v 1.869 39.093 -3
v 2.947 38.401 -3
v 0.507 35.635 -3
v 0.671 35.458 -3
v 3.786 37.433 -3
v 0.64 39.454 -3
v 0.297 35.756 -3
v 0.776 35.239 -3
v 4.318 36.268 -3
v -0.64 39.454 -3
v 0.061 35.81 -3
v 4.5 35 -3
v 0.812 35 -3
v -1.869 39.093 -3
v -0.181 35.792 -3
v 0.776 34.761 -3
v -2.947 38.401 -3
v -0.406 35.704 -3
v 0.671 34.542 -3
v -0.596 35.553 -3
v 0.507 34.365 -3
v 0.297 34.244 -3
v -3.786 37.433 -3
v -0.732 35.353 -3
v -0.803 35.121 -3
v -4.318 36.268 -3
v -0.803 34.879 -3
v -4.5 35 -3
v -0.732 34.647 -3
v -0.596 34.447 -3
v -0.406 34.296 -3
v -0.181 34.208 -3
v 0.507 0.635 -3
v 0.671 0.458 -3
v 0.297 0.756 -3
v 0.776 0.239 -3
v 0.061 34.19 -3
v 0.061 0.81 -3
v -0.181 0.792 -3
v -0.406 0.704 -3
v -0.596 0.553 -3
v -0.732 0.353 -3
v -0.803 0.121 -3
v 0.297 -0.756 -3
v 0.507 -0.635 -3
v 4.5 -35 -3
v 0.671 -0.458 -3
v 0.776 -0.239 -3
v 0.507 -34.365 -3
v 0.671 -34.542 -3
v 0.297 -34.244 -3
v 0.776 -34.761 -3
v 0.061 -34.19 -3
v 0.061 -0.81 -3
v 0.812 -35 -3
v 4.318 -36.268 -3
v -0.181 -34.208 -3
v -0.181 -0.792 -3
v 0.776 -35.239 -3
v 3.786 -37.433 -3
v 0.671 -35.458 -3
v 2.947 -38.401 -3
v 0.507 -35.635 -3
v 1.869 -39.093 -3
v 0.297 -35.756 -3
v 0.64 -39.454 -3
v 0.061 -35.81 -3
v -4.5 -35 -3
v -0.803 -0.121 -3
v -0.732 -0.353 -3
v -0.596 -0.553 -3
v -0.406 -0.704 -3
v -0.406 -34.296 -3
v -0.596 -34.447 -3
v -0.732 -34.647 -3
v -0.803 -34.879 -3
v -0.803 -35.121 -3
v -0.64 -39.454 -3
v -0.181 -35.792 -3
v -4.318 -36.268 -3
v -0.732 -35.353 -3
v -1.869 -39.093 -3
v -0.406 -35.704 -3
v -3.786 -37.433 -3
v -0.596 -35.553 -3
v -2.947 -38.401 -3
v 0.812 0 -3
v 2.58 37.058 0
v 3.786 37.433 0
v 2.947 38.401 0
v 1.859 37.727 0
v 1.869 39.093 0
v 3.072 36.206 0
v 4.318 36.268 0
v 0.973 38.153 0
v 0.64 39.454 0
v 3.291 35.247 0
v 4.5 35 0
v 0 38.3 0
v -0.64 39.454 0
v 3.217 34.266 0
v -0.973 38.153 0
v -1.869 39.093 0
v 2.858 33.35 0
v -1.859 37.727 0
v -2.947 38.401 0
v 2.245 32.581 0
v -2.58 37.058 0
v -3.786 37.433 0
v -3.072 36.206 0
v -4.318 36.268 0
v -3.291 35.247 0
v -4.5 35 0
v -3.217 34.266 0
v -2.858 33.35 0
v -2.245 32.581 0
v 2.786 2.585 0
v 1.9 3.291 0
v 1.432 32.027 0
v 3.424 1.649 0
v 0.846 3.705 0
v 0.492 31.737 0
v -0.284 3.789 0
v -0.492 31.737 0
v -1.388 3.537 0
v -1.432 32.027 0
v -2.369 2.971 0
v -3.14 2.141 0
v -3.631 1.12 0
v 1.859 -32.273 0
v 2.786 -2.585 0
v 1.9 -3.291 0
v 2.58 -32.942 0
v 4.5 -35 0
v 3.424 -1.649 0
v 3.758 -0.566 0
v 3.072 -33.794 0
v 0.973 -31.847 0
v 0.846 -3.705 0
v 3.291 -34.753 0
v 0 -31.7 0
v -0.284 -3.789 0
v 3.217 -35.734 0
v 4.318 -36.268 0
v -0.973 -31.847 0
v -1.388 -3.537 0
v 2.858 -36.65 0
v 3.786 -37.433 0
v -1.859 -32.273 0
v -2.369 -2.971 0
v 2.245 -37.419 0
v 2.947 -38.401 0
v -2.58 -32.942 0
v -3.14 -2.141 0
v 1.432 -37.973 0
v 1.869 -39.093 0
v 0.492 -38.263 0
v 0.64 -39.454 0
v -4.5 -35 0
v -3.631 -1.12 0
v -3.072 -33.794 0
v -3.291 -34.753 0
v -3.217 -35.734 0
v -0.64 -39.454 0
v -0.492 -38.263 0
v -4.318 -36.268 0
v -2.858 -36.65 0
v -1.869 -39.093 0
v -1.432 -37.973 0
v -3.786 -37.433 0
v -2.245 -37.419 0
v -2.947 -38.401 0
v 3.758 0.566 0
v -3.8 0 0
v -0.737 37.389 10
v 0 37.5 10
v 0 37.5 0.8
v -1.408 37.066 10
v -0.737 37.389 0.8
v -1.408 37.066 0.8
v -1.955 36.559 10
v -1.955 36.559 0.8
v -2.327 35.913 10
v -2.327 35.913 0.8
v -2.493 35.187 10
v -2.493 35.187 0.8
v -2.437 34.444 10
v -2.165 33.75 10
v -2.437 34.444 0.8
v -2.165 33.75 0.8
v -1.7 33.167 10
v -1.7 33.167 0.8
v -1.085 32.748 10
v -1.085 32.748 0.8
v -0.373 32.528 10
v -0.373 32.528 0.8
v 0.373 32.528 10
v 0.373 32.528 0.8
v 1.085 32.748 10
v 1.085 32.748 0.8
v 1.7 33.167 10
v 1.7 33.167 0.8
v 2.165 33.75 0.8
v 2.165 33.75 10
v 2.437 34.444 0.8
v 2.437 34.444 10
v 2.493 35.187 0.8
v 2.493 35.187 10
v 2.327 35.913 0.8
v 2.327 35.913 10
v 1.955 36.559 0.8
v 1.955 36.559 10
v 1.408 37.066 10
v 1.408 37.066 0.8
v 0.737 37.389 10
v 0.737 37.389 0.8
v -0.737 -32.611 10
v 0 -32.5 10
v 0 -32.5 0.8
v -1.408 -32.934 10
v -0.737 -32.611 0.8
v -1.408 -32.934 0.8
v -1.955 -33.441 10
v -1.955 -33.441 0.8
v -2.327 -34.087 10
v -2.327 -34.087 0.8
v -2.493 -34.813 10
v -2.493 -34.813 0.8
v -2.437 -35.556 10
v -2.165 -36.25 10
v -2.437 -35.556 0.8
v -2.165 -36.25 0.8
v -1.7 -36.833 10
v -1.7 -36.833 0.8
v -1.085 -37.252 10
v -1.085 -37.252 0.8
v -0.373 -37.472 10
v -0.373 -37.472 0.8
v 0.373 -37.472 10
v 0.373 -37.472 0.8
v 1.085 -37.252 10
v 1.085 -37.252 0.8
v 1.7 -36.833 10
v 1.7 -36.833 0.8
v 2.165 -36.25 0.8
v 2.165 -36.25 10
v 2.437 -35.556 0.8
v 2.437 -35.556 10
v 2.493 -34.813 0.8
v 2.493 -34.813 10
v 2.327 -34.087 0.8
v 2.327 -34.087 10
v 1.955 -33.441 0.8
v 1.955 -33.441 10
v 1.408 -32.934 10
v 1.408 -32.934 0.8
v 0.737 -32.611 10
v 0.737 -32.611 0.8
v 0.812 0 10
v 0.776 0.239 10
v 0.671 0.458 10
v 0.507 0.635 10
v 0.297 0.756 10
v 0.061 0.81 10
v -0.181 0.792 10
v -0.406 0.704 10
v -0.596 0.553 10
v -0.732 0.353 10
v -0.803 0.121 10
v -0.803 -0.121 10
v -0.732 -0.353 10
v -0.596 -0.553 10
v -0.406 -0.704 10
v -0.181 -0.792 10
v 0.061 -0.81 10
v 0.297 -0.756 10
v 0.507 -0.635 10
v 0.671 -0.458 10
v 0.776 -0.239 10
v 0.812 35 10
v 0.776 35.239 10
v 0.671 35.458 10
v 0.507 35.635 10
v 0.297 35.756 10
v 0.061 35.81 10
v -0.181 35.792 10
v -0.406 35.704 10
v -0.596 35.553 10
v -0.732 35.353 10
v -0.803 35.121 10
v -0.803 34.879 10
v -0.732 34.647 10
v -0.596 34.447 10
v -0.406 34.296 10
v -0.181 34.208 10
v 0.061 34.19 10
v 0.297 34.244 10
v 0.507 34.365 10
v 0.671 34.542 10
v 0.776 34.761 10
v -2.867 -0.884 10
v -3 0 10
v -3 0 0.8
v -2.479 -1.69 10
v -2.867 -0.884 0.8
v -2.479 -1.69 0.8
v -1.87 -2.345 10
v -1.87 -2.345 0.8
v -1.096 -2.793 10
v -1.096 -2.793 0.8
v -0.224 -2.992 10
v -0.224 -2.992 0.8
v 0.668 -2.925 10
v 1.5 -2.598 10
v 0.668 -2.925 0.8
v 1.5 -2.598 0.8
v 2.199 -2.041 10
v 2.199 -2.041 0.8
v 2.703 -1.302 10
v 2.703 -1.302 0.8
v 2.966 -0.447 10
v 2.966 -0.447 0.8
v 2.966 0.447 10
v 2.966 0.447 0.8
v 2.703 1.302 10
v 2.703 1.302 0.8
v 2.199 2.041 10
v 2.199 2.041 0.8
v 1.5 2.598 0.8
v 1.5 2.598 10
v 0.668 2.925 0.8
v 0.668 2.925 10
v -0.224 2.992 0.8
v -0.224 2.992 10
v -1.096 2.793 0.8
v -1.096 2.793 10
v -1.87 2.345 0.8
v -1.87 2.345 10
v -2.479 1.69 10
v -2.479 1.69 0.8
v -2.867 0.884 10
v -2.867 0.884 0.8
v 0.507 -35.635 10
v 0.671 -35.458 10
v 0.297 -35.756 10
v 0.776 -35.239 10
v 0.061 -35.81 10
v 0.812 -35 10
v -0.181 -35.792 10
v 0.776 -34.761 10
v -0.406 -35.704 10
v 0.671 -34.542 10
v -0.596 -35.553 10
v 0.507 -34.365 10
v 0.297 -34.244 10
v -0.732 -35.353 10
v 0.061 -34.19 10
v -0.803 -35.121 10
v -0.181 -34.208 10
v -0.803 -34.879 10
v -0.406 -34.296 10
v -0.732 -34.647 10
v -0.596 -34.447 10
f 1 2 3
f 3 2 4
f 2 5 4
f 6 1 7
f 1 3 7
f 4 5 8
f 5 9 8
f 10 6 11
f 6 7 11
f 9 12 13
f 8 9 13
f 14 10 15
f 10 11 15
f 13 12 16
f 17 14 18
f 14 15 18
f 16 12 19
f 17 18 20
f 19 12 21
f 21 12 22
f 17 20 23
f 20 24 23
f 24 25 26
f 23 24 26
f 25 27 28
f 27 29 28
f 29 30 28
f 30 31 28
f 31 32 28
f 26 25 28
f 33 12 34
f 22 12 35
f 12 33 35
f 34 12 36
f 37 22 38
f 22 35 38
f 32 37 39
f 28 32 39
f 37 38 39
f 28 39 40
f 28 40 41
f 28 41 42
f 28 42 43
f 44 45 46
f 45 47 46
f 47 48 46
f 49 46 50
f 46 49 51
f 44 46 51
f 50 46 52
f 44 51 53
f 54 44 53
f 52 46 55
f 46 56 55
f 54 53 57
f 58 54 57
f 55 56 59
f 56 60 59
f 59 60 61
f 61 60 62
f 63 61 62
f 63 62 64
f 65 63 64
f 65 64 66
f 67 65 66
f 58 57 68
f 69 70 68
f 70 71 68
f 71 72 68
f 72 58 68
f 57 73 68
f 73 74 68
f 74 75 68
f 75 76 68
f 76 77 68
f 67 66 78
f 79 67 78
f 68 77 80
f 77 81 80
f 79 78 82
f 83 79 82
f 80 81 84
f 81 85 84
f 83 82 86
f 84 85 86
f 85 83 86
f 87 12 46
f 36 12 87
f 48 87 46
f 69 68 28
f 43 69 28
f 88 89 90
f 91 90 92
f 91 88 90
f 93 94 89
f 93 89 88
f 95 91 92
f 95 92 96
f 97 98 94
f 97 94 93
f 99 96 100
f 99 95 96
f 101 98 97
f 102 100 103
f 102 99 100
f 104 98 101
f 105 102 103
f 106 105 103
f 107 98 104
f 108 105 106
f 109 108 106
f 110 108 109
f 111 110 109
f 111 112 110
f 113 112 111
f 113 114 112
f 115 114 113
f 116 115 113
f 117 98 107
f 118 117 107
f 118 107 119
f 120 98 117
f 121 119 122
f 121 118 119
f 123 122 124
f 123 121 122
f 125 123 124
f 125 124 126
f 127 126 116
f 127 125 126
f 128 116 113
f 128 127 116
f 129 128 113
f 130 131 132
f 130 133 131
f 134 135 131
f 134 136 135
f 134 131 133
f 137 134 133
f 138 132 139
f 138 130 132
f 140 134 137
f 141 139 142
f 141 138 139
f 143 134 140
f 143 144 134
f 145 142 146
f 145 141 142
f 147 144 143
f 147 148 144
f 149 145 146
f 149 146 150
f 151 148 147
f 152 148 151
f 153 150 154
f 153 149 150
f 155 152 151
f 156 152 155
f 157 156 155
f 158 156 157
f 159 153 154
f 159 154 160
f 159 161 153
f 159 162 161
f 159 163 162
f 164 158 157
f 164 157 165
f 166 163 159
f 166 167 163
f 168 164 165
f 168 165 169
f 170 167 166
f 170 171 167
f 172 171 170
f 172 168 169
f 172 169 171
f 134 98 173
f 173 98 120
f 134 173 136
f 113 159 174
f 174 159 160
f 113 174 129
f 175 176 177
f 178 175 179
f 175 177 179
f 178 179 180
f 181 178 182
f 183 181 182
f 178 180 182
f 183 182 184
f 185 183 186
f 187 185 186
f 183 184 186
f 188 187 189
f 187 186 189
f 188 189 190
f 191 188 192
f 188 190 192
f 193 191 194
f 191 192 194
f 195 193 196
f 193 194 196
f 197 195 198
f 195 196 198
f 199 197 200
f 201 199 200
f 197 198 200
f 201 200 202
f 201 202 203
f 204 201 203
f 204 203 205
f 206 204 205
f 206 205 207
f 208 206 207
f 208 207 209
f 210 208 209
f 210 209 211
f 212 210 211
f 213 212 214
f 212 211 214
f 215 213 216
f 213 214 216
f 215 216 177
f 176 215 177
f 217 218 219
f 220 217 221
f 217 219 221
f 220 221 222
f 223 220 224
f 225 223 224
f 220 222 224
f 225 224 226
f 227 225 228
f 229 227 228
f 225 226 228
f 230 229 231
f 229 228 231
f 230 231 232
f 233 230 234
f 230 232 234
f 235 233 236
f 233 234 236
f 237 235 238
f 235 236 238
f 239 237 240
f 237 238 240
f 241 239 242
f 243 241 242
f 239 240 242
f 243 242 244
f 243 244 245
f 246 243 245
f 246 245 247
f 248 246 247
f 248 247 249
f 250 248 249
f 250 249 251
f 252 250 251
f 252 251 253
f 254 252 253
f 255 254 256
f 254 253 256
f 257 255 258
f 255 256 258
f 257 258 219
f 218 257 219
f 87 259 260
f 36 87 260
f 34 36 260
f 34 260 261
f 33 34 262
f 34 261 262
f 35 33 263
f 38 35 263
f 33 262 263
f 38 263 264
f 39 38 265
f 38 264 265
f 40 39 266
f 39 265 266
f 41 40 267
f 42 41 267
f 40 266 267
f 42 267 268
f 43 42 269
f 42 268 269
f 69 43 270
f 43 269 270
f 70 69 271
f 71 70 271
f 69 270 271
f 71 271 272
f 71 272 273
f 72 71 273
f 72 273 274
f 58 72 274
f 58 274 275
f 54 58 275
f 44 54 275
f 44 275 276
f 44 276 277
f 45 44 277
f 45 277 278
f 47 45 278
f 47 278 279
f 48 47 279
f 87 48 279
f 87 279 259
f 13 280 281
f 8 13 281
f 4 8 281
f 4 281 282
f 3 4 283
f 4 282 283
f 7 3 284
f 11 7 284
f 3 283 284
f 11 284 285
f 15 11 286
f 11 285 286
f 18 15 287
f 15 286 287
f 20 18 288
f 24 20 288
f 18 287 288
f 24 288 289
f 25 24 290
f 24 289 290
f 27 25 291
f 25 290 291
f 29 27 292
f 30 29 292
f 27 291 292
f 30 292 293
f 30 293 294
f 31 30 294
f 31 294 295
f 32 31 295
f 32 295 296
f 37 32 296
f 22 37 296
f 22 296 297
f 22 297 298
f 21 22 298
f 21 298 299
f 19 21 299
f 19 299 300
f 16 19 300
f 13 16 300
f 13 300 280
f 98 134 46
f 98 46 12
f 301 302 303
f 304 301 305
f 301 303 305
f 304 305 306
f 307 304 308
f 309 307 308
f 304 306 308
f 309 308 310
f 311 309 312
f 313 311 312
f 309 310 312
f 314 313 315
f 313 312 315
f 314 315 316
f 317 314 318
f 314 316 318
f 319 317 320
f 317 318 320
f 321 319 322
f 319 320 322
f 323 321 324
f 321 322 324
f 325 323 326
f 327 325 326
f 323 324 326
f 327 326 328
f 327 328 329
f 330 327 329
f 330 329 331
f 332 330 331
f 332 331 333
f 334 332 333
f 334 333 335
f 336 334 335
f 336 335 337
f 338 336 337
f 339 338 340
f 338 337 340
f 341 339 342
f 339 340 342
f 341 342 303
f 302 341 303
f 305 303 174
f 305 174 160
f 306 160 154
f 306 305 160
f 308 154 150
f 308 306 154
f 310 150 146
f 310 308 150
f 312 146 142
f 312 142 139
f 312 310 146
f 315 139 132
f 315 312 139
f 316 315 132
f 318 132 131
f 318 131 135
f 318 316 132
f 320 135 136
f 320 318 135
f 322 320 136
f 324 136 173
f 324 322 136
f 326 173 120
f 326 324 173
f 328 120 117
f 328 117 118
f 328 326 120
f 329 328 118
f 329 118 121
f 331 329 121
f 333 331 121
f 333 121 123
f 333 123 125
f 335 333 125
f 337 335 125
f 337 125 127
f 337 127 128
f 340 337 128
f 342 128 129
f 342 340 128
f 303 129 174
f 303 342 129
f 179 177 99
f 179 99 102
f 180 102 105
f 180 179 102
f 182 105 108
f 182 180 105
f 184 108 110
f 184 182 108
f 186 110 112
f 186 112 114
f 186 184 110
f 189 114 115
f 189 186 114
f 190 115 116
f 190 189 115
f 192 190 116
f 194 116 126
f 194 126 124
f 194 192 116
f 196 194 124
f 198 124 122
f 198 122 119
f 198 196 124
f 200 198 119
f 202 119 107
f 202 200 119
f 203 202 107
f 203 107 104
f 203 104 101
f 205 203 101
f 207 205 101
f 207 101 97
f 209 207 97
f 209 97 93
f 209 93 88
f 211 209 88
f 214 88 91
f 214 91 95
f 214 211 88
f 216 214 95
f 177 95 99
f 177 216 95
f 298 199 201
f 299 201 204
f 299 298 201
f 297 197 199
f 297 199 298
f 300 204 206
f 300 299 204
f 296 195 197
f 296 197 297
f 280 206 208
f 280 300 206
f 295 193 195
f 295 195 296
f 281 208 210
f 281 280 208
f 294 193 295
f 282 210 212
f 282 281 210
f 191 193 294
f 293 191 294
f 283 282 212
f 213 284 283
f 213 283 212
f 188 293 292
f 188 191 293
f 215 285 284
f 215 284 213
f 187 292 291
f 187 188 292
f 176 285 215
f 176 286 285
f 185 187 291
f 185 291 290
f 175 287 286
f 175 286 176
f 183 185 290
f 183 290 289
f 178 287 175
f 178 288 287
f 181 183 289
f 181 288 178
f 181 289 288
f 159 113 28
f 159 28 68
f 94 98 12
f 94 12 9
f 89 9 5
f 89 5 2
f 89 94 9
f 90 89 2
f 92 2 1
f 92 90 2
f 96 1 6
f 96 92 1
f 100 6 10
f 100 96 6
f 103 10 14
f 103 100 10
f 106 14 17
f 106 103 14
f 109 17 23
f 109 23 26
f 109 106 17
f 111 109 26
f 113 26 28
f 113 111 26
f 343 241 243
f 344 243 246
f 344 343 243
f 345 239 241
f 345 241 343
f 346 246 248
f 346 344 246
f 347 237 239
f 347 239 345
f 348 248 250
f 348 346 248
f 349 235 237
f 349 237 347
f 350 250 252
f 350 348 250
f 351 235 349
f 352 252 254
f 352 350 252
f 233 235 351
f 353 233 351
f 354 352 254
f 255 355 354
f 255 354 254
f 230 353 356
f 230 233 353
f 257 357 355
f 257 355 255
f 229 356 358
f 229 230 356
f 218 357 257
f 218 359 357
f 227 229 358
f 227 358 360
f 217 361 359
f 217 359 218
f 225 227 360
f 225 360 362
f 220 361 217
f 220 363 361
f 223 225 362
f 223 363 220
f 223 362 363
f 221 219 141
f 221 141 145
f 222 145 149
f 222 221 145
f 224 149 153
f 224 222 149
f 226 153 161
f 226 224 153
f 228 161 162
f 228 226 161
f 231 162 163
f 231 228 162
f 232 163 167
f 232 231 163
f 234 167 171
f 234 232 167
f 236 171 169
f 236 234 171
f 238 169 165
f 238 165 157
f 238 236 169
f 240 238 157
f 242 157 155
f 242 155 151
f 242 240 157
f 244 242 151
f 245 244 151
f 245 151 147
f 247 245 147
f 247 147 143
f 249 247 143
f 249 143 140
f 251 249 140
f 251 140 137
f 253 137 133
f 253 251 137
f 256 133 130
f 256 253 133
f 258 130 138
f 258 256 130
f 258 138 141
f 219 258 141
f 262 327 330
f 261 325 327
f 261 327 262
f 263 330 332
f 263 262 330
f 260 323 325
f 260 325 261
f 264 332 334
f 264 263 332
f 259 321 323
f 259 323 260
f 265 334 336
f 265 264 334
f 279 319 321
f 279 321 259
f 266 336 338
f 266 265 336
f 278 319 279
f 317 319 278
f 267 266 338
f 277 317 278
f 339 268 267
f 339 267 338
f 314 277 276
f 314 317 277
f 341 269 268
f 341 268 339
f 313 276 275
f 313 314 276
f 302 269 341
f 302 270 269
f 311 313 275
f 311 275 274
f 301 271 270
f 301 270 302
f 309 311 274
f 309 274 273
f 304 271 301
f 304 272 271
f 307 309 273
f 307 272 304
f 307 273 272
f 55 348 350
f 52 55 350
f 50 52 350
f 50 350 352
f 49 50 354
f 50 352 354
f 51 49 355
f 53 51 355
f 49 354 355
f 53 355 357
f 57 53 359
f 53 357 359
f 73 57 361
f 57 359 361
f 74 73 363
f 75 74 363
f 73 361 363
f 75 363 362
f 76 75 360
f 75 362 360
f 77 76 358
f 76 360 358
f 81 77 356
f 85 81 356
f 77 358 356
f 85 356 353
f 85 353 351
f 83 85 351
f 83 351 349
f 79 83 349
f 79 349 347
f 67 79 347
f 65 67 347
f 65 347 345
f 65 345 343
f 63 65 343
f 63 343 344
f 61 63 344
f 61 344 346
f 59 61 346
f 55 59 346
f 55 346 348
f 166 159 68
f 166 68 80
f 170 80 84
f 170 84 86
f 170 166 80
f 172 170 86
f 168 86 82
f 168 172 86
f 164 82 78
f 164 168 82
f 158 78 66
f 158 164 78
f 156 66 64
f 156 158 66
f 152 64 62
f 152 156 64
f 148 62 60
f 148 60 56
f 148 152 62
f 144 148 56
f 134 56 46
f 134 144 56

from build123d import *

# Parameters (mm, degrees)
SKETCH1_R             = 2.5
BOSS_EXTRUDE1_DEPTH   = 10
BOSS_EXTRUDE1_2_DEPTH = 10
BOSS_EXTRUDE2_DEPTH   = 3
SKETCH3_R             = 0.8125
CUT_EXTRUDE1_DEPTH    = 20
CHAMFER1_SIZE         = 0.8
SKETCH4_R             = 3
BOSS_EXTRUDE3_DEPTH   = 10
CHAMFER2_SIZE         = 0.8
SKETCH5_R             = 0.8125
CUT_EXTRUDE2_DEPTH    = 20


with BuildPart() as part:
    # Sketch1 → Boss-Extrude1 (new body)
    with BuildSketch(Plane(origin=(0, 0, 0), x_dir=(0, 1, 0), z_dir=(0, 0, 1))):
        with Locations((-35, 0)):
            Circle(SKETCH1_R)
    extrude(amount=BOSS_EXTRUDE1_DEPTH)



with BuildPart() as body_2:
    # Sketch1 → Boss-Extrude1 2 (new body)
    with BuildSketch(Plane(origin=(0, 0, 0), x_dir=(0, 1, 0), z_dir=(0, 0, 1))):
        with Locations((35, 0)):
            Circle(SKETCH1_R)
    extrude(amount=BOSS_EXTRUDE1_2_DEPTH)


with BuildPart() as part_1:
    add(part.part)

    add(body_2.part)  # Boss-Extrude2 merges body 2
    # Sketch2 → Boss-Extrude2 (add)
    with BuildSketch(Plane(origin=(0, 0, 0), x_dir=(1, 0, 0), z_dir=(0, 0, -1))):
        with BuildLine():
            Line((4.5, 35), (4.5, -35))
            ThreePointArc((4.5, -35), (0, -39.5), (-4.5, -35))
            Line((-4.5, -35), (-4.5, 35))
            ThreePointArc((-4.5, 35), (0, 39.5), (4.5, 35))
        make_face()
    extrude(amount=BOSS_EXTRUDE2_DEPTH)

    # Sketch3 → Cut-Extrude1 (cut)
    with BuildSketch(Plane.XY.offset(10)):
        with Locations((0, -35)):
            Circle(SKETCH3_R)
        with Locations((0, 35)):
            Circle(SKETCH3_R)
    extrude(amount=-CUT_EXTRUDE1_DEPTH, mode=Mode.SUBTRACT)

    # Chamfer1
    chamfer1_edges = [part_1.edges().sort_by_distance(p)[0] for p in [
        (0, 32.5, 0),
        (0, -37.5, 0),
    ]]
    chamfer(chamfer1_edges, length=CHAMFER1_SIZE)

    # Sketch4 → Boss-Extrude3 (add)
    with BuildSketch(Plane.XY):
        with Locations(Location((0, 0, 0), (0, 0, 180))):
            Circle(SKETCH4_R)
    extrude(amount=BOSS_EXTRUDE3_DEPTH)

    # Chamfer2
    chamfer2_edges = [part_1.edges().sort_by_distance(p)[0] for p in [
        (3, 0, 0),
    ]]
    chamfer(chamfer2_edges, length=CHAMFER2_SIZE)

    # Sketch5 → Cut-Extrude2 (cut)
    with BuildSketch(Plane.XY.offset(10)):
        Circle(SKETCH5_R)
    extrude(amount=-CUT_EXTRUDE2_DEPTH, mode=Mode.SUBTRACT)


solid = part_1.part
